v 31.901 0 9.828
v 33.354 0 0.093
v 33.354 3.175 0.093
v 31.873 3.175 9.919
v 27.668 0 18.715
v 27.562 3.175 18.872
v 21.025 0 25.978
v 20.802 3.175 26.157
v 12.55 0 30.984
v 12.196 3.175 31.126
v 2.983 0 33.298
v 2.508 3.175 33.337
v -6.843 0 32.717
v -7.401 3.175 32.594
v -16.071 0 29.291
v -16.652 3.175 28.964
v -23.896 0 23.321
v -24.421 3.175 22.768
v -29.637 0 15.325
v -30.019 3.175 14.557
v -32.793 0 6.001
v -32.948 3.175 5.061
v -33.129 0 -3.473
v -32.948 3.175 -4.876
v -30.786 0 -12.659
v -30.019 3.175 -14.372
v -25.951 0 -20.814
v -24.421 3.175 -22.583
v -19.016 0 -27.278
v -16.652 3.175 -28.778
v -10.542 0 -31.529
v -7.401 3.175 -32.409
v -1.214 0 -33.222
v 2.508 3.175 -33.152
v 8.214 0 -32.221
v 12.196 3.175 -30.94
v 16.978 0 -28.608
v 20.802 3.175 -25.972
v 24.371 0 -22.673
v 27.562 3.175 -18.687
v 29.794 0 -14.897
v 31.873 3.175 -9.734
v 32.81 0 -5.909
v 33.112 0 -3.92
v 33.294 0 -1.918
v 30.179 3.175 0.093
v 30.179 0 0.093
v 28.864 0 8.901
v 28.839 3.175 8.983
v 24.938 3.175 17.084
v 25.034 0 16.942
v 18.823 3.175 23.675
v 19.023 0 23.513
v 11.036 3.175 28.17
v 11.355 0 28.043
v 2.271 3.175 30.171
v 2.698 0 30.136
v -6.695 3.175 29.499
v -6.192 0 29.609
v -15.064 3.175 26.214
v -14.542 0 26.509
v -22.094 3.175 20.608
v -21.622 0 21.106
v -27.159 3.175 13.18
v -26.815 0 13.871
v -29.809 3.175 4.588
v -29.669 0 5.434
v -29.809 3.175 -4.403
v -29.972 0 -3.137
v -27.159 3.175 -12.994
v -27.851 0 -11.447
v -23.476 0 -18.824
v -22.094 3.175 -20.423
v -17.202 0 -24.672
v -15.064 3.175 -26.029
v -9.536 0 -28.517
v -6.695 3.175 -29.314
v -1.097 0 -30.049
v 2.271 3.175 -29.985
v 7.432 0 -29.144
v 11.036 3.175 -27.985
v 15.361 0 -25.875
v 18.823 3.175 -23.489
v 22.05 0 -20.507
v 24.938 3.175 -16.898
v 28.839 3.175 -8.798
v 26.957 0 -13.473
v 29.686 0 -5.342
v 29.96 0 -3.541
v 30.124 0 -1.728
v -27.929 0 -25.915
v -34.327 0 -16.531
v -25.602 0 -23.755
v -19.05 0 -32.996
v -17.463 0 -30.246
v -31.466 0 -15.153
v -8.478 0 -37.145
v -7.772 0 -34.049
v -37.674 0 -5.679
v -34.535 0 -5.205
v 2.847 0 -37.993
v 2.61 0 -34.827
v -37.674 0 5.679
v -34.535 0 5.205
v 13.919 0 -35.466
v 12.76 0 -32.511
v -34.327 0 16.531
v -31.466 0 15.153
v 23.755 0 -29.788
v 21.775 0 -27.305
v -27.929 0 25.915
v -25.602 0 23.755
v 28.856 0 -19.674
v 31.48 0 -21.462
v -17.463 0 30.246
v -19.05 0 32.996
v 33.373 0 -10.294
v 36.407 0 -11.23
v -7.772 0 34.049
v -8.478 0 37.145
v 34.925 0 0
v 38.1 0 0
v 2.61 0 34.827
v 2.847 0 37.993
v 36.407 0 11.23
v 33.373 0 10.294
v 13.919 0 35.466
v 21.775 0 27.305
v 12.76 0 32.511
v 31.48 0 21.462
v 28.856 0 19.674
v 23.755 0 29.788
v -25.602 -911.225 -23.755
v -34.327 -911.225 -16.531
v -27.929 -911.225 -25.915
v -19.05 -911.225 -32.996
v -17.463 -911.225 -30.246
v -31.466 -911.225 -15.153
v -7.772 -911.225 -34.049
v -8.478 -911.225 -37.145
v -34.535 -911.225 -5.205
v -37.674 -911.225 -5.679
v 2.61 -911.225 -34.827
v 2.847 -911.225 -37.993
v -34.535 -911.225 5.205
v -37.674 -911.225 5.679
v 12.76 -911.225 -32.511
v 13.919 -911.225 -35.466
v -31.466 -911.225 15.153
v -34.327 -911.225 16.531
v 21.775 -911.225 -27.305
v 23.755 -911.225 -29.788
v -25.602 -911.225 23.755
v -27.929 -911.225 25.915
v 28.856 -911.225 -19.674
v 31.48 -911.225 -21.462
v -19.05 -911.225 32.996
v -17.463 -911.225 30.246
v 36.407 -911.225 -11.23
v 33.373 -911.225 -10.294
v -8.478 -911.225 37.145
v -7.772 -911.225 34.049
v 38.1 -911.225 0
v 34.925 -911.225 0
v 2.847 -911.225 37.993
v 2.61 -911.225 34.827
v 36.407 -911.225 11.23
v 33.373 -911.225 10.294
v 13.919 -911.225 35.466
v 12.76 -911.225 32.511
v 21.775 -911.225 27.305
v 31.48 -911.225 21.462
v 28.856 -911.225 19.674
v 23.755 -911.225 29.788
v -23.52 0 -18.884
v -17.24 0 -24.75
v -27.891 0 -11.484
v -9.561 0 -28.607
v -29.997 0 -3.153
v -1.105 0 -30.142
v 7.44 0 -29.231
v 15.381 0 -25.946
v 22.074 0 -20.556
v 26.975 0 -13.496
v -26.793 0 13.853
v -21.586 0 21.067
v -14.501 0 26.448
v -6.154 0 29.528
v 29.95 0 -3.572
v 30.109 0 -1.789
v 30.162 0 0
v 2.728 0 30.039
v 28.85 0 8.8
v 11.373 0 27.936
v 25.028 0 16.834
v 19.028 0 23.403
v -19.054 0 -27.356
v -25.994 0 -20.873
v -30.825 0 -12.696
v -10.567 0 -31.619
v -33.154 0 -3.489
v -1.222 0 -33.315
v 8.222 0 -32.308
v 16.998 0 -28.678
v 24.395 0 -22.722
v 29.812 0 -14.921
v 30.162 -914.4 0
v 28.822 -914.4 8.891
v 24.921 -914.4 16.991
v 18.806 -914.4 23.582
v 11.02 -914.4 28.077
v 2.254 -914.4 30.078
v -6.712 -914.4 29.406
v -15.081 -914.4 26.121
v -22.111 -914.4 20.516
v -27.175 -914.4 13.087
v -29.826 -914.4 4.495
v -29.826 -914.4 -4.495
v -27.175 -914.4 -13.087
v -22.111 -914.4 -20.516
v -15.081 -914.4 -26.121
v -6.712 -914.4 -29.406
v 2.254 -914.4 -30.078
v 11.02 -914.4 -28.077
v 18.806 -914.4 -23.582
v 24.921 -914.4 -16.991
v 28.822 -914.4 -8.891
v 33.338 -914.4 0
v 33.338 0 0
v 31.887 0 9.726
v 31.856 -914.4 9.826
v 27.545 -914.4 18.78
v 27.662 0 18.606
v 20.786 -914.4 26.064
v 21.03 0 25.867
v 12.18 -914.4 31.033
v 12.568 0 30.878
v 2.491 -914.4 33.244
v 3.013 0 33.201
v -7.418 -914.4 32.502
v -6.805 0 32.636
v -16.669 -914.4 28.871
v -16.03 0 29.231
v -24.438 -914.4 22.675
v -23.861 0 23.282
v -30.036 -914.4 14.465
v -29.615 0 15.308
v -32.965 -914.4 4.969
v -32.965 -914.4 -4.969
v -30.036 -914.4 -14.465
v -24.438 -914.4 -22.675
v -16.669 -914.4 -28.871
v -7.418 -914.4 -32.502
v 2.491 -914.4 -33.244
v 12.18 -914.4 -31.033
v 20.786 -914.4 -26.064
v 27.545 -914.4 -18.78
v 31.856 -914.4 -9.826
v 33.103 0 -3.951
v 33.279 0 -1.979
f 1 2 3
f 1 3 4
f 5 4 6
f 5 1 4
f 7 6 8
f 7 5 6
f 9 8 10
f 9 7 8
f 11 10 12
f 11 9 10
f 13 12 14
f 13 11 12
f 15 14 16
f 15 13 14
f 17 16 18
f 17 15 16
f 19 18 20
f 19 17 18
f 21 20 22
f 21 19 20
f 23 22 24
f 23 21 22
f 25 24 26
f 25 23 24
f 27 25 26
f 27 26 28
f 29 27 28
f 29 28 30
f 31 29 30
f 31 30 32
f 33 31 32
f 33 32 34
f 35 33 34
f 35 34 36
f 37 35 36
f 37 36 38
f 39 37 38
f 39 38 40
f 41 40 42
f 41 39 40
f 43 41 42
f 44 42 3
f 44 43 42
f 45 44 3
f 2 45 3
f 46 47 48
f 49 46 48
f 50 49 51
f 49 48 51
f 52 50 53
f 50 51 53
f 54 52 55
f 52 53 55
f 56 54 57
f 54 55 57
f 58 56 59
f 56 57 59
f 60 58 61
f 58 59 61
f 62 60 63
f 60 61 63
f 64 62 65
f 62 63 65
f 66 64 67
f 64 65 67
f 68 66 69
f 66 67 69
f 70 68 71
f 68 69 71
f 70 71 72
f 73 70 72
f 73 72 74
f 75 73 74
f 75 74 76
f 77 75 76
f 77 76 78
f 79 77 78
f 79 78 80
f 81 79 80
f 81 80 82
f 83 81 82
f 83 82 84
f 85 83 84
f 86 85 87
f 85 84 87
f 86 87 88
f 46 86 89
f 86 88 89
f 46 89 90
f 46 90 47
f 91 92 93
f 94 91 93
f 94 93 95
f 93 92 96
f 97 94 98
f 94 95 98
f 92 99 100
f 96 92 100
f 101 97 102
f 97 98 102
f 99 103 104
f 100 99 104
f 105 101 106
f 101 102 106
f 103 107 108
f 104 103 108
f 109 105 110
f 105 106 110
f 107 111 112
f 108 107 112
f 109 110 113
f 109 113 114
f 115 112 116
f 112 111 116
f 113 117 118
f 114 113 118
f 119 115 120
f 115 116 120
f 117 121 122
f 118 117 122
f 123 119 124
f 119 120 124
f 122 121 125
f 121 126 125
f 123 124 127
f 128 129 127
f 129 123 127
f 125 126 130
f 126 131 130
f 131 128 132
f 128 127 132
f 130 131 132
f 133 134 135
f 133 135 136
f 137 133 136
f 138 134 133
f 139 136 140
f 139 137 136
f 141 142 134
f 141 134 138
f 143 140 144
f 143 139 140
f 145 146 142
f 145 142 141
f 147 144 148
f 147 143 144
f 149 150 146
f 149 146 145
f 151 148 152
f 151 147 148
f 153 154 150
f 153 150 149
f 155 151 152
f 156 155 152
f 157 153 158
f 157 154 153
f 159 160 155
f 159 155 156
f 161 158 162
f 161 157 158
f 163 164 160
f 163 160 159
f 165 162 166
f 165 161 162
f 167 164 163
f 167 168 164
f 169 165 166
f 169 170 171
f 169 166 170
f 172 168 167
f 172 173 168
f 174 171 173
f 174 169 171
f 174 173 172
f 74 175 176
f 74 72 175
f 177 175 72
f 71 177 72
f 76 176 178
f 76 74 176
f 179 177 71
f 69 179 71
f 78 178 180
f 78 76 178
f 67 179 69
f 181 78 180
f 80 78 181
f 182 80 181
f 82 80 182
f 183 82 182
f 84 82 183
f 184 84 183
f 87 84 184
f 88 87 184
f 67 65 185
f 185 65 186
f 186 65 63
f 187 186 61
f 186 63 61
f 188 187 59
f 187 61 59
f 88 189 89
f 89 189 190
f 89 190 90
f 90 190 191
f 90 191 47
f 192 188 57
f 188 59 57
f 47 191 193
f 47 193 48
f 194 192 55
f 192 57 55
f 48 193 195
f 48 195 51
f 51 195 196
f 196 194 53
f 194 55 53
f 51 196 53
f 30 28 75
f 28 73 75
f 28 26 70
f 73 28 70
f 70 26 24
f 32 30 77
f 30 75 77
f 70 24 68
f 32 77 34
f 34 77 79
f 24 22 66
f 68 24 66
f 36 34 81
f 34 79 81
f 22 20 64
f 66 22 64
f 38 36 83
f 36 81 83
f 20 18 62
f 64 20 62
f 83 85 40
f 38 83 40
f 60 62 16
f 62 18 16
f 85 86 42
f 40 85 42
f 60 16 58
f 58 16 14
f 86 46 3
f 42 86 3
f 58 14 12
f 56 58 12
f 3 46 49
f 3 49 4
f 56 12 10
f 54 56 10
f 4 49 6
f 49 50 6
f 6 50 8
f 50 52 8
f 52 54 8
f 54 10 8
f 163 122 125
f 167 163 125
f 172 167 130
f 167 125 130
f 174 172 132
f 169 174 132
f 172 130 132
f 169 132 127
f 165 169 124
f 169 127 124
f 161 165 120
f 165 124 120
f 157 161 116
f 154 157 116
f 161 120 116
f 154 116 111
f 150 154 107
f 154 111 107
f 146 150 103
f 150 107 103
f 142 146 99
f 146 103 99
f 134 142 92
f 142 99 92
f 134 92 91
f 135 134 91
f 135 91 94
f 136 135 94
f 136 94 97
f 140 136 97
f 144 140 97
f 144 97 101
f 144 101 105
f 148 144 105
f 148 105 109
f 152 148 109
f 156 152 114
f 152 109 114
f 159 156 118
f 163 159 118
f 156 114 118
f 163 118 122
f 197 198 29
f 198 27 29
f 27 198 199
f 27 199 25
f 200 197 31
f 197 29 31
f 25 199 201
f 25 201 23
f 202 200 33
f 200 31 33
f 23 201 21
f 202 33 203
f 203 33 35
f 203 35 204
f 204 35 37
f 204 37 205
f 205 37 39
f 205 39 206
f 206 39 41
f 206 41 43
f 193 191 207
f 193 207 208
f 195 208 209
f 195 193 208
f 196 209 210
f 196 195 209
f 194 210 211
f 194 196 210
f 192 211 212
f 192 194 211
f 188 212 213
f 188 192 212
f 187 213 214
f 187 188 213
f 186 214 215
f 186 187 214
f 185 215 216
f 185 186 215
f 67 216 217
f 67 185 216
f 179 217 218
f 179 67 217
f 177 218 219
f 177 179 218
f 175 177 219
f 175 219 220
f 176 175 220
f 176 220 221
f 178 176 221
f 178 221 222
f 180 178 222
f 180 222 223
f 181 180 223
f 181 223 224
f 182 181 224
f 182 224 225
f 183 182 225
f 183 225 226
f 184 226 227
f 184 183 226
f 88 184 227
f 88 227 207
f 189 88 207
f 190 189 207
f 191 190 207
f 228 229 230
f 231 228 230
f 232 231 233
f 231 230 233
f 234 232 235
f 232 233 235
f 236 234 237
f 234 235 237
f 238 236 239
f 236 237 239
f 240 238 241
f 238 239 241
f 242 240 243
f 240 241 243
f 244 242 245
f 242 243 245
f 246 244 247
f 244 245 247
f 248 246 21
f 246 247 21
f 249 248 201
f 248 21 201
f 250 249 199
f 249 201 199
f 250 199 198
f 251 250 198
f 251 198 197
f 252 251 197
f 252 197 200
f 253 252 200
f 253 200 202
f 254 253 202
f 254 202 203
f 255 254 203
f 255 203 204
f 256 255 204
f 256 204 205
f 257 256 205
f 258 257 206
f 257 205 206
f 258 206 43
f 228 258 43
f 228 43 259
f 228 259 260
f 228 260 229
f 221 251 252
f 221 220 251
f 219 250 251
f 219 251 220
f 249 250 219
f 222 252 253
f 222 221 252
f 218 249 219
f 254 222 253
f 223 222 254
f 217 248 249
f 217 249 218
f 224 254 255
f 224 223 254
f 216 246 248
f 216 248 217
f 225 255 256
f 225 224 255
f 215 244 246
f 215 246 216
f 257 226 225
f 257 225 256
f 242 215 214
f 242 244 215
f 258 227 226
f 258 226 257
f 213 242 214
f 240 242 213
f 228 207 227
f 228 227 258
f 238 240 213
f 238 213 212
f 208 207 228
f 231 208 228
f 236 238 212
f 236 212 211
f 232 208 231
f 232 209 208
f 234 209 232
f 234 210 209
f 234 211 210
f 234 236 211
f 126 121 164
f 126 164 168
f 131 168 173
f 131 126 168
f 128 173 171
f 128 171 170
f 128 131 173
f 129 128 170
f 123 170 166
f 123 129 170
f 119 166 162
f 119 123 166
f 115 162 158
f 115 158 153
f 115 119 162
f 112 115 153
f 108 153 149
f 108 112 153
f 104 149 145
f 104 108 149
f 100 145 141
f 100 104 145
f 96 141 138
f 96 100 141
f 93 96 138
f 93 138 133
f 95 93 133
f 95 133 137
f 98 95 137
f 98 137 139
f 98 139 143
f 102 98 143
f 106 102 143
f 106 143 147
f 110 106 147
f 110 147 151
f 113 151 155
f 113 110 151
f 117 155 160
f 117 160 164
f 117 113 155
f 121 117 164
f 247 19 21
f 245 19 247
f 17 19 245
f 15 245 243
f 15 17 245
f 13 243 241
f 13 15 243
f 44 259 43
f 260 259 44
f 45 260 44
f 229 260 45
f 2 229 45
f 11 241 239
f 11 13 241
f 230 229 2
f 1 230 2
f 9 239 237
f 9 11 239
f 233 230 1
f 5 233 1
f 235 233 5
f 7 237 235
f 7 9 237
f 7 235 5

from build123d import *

# Parameters (mm, degrees)
F0_R     = 38.1
F0_R_2   = 34.925
F1_DEPTH = 911.225
F0_R_3   = 33.3375
F0_R_4   = 30.1625
F2_DEPTH = 914.4
F3_R     = 33.3375
F3_R_2   = 30.1625
F4_DEPTH = 3.175


with BuildPart() as f1:
    # F0 (on Front) → F1 (new body)
    with BuildSketch(Plane.XZ):
        Circle(F0_R)
        Circle(F0_R_2, mode=Mode.SUBTRACT)
    extrude(amount=F1_DEPTH)


with BuildPart() as f2:
    # F0 (on Front) → F2 (new body)
    with BuildSketch(Plane.XZ):
        Circle(F0_R_3)
        Circle(F0_R_4, mode=Mode.SUBTRACT)
    extrude(amount=F2_DEPTH)

    # F3 (on Front) → F4 (join)
    with BuildSketch(Plane.XZ):
        with Locations((0.016823, 0.092663)):
            Circle(F3_R)
        with Locations((0.016823, 0.092663)):
            Circle(F3_R_2, mode=Mode.SUBTRACT)
    extrude(amount=-F4_DEPTH)


solid = Compound([f1.part, f2.part])
